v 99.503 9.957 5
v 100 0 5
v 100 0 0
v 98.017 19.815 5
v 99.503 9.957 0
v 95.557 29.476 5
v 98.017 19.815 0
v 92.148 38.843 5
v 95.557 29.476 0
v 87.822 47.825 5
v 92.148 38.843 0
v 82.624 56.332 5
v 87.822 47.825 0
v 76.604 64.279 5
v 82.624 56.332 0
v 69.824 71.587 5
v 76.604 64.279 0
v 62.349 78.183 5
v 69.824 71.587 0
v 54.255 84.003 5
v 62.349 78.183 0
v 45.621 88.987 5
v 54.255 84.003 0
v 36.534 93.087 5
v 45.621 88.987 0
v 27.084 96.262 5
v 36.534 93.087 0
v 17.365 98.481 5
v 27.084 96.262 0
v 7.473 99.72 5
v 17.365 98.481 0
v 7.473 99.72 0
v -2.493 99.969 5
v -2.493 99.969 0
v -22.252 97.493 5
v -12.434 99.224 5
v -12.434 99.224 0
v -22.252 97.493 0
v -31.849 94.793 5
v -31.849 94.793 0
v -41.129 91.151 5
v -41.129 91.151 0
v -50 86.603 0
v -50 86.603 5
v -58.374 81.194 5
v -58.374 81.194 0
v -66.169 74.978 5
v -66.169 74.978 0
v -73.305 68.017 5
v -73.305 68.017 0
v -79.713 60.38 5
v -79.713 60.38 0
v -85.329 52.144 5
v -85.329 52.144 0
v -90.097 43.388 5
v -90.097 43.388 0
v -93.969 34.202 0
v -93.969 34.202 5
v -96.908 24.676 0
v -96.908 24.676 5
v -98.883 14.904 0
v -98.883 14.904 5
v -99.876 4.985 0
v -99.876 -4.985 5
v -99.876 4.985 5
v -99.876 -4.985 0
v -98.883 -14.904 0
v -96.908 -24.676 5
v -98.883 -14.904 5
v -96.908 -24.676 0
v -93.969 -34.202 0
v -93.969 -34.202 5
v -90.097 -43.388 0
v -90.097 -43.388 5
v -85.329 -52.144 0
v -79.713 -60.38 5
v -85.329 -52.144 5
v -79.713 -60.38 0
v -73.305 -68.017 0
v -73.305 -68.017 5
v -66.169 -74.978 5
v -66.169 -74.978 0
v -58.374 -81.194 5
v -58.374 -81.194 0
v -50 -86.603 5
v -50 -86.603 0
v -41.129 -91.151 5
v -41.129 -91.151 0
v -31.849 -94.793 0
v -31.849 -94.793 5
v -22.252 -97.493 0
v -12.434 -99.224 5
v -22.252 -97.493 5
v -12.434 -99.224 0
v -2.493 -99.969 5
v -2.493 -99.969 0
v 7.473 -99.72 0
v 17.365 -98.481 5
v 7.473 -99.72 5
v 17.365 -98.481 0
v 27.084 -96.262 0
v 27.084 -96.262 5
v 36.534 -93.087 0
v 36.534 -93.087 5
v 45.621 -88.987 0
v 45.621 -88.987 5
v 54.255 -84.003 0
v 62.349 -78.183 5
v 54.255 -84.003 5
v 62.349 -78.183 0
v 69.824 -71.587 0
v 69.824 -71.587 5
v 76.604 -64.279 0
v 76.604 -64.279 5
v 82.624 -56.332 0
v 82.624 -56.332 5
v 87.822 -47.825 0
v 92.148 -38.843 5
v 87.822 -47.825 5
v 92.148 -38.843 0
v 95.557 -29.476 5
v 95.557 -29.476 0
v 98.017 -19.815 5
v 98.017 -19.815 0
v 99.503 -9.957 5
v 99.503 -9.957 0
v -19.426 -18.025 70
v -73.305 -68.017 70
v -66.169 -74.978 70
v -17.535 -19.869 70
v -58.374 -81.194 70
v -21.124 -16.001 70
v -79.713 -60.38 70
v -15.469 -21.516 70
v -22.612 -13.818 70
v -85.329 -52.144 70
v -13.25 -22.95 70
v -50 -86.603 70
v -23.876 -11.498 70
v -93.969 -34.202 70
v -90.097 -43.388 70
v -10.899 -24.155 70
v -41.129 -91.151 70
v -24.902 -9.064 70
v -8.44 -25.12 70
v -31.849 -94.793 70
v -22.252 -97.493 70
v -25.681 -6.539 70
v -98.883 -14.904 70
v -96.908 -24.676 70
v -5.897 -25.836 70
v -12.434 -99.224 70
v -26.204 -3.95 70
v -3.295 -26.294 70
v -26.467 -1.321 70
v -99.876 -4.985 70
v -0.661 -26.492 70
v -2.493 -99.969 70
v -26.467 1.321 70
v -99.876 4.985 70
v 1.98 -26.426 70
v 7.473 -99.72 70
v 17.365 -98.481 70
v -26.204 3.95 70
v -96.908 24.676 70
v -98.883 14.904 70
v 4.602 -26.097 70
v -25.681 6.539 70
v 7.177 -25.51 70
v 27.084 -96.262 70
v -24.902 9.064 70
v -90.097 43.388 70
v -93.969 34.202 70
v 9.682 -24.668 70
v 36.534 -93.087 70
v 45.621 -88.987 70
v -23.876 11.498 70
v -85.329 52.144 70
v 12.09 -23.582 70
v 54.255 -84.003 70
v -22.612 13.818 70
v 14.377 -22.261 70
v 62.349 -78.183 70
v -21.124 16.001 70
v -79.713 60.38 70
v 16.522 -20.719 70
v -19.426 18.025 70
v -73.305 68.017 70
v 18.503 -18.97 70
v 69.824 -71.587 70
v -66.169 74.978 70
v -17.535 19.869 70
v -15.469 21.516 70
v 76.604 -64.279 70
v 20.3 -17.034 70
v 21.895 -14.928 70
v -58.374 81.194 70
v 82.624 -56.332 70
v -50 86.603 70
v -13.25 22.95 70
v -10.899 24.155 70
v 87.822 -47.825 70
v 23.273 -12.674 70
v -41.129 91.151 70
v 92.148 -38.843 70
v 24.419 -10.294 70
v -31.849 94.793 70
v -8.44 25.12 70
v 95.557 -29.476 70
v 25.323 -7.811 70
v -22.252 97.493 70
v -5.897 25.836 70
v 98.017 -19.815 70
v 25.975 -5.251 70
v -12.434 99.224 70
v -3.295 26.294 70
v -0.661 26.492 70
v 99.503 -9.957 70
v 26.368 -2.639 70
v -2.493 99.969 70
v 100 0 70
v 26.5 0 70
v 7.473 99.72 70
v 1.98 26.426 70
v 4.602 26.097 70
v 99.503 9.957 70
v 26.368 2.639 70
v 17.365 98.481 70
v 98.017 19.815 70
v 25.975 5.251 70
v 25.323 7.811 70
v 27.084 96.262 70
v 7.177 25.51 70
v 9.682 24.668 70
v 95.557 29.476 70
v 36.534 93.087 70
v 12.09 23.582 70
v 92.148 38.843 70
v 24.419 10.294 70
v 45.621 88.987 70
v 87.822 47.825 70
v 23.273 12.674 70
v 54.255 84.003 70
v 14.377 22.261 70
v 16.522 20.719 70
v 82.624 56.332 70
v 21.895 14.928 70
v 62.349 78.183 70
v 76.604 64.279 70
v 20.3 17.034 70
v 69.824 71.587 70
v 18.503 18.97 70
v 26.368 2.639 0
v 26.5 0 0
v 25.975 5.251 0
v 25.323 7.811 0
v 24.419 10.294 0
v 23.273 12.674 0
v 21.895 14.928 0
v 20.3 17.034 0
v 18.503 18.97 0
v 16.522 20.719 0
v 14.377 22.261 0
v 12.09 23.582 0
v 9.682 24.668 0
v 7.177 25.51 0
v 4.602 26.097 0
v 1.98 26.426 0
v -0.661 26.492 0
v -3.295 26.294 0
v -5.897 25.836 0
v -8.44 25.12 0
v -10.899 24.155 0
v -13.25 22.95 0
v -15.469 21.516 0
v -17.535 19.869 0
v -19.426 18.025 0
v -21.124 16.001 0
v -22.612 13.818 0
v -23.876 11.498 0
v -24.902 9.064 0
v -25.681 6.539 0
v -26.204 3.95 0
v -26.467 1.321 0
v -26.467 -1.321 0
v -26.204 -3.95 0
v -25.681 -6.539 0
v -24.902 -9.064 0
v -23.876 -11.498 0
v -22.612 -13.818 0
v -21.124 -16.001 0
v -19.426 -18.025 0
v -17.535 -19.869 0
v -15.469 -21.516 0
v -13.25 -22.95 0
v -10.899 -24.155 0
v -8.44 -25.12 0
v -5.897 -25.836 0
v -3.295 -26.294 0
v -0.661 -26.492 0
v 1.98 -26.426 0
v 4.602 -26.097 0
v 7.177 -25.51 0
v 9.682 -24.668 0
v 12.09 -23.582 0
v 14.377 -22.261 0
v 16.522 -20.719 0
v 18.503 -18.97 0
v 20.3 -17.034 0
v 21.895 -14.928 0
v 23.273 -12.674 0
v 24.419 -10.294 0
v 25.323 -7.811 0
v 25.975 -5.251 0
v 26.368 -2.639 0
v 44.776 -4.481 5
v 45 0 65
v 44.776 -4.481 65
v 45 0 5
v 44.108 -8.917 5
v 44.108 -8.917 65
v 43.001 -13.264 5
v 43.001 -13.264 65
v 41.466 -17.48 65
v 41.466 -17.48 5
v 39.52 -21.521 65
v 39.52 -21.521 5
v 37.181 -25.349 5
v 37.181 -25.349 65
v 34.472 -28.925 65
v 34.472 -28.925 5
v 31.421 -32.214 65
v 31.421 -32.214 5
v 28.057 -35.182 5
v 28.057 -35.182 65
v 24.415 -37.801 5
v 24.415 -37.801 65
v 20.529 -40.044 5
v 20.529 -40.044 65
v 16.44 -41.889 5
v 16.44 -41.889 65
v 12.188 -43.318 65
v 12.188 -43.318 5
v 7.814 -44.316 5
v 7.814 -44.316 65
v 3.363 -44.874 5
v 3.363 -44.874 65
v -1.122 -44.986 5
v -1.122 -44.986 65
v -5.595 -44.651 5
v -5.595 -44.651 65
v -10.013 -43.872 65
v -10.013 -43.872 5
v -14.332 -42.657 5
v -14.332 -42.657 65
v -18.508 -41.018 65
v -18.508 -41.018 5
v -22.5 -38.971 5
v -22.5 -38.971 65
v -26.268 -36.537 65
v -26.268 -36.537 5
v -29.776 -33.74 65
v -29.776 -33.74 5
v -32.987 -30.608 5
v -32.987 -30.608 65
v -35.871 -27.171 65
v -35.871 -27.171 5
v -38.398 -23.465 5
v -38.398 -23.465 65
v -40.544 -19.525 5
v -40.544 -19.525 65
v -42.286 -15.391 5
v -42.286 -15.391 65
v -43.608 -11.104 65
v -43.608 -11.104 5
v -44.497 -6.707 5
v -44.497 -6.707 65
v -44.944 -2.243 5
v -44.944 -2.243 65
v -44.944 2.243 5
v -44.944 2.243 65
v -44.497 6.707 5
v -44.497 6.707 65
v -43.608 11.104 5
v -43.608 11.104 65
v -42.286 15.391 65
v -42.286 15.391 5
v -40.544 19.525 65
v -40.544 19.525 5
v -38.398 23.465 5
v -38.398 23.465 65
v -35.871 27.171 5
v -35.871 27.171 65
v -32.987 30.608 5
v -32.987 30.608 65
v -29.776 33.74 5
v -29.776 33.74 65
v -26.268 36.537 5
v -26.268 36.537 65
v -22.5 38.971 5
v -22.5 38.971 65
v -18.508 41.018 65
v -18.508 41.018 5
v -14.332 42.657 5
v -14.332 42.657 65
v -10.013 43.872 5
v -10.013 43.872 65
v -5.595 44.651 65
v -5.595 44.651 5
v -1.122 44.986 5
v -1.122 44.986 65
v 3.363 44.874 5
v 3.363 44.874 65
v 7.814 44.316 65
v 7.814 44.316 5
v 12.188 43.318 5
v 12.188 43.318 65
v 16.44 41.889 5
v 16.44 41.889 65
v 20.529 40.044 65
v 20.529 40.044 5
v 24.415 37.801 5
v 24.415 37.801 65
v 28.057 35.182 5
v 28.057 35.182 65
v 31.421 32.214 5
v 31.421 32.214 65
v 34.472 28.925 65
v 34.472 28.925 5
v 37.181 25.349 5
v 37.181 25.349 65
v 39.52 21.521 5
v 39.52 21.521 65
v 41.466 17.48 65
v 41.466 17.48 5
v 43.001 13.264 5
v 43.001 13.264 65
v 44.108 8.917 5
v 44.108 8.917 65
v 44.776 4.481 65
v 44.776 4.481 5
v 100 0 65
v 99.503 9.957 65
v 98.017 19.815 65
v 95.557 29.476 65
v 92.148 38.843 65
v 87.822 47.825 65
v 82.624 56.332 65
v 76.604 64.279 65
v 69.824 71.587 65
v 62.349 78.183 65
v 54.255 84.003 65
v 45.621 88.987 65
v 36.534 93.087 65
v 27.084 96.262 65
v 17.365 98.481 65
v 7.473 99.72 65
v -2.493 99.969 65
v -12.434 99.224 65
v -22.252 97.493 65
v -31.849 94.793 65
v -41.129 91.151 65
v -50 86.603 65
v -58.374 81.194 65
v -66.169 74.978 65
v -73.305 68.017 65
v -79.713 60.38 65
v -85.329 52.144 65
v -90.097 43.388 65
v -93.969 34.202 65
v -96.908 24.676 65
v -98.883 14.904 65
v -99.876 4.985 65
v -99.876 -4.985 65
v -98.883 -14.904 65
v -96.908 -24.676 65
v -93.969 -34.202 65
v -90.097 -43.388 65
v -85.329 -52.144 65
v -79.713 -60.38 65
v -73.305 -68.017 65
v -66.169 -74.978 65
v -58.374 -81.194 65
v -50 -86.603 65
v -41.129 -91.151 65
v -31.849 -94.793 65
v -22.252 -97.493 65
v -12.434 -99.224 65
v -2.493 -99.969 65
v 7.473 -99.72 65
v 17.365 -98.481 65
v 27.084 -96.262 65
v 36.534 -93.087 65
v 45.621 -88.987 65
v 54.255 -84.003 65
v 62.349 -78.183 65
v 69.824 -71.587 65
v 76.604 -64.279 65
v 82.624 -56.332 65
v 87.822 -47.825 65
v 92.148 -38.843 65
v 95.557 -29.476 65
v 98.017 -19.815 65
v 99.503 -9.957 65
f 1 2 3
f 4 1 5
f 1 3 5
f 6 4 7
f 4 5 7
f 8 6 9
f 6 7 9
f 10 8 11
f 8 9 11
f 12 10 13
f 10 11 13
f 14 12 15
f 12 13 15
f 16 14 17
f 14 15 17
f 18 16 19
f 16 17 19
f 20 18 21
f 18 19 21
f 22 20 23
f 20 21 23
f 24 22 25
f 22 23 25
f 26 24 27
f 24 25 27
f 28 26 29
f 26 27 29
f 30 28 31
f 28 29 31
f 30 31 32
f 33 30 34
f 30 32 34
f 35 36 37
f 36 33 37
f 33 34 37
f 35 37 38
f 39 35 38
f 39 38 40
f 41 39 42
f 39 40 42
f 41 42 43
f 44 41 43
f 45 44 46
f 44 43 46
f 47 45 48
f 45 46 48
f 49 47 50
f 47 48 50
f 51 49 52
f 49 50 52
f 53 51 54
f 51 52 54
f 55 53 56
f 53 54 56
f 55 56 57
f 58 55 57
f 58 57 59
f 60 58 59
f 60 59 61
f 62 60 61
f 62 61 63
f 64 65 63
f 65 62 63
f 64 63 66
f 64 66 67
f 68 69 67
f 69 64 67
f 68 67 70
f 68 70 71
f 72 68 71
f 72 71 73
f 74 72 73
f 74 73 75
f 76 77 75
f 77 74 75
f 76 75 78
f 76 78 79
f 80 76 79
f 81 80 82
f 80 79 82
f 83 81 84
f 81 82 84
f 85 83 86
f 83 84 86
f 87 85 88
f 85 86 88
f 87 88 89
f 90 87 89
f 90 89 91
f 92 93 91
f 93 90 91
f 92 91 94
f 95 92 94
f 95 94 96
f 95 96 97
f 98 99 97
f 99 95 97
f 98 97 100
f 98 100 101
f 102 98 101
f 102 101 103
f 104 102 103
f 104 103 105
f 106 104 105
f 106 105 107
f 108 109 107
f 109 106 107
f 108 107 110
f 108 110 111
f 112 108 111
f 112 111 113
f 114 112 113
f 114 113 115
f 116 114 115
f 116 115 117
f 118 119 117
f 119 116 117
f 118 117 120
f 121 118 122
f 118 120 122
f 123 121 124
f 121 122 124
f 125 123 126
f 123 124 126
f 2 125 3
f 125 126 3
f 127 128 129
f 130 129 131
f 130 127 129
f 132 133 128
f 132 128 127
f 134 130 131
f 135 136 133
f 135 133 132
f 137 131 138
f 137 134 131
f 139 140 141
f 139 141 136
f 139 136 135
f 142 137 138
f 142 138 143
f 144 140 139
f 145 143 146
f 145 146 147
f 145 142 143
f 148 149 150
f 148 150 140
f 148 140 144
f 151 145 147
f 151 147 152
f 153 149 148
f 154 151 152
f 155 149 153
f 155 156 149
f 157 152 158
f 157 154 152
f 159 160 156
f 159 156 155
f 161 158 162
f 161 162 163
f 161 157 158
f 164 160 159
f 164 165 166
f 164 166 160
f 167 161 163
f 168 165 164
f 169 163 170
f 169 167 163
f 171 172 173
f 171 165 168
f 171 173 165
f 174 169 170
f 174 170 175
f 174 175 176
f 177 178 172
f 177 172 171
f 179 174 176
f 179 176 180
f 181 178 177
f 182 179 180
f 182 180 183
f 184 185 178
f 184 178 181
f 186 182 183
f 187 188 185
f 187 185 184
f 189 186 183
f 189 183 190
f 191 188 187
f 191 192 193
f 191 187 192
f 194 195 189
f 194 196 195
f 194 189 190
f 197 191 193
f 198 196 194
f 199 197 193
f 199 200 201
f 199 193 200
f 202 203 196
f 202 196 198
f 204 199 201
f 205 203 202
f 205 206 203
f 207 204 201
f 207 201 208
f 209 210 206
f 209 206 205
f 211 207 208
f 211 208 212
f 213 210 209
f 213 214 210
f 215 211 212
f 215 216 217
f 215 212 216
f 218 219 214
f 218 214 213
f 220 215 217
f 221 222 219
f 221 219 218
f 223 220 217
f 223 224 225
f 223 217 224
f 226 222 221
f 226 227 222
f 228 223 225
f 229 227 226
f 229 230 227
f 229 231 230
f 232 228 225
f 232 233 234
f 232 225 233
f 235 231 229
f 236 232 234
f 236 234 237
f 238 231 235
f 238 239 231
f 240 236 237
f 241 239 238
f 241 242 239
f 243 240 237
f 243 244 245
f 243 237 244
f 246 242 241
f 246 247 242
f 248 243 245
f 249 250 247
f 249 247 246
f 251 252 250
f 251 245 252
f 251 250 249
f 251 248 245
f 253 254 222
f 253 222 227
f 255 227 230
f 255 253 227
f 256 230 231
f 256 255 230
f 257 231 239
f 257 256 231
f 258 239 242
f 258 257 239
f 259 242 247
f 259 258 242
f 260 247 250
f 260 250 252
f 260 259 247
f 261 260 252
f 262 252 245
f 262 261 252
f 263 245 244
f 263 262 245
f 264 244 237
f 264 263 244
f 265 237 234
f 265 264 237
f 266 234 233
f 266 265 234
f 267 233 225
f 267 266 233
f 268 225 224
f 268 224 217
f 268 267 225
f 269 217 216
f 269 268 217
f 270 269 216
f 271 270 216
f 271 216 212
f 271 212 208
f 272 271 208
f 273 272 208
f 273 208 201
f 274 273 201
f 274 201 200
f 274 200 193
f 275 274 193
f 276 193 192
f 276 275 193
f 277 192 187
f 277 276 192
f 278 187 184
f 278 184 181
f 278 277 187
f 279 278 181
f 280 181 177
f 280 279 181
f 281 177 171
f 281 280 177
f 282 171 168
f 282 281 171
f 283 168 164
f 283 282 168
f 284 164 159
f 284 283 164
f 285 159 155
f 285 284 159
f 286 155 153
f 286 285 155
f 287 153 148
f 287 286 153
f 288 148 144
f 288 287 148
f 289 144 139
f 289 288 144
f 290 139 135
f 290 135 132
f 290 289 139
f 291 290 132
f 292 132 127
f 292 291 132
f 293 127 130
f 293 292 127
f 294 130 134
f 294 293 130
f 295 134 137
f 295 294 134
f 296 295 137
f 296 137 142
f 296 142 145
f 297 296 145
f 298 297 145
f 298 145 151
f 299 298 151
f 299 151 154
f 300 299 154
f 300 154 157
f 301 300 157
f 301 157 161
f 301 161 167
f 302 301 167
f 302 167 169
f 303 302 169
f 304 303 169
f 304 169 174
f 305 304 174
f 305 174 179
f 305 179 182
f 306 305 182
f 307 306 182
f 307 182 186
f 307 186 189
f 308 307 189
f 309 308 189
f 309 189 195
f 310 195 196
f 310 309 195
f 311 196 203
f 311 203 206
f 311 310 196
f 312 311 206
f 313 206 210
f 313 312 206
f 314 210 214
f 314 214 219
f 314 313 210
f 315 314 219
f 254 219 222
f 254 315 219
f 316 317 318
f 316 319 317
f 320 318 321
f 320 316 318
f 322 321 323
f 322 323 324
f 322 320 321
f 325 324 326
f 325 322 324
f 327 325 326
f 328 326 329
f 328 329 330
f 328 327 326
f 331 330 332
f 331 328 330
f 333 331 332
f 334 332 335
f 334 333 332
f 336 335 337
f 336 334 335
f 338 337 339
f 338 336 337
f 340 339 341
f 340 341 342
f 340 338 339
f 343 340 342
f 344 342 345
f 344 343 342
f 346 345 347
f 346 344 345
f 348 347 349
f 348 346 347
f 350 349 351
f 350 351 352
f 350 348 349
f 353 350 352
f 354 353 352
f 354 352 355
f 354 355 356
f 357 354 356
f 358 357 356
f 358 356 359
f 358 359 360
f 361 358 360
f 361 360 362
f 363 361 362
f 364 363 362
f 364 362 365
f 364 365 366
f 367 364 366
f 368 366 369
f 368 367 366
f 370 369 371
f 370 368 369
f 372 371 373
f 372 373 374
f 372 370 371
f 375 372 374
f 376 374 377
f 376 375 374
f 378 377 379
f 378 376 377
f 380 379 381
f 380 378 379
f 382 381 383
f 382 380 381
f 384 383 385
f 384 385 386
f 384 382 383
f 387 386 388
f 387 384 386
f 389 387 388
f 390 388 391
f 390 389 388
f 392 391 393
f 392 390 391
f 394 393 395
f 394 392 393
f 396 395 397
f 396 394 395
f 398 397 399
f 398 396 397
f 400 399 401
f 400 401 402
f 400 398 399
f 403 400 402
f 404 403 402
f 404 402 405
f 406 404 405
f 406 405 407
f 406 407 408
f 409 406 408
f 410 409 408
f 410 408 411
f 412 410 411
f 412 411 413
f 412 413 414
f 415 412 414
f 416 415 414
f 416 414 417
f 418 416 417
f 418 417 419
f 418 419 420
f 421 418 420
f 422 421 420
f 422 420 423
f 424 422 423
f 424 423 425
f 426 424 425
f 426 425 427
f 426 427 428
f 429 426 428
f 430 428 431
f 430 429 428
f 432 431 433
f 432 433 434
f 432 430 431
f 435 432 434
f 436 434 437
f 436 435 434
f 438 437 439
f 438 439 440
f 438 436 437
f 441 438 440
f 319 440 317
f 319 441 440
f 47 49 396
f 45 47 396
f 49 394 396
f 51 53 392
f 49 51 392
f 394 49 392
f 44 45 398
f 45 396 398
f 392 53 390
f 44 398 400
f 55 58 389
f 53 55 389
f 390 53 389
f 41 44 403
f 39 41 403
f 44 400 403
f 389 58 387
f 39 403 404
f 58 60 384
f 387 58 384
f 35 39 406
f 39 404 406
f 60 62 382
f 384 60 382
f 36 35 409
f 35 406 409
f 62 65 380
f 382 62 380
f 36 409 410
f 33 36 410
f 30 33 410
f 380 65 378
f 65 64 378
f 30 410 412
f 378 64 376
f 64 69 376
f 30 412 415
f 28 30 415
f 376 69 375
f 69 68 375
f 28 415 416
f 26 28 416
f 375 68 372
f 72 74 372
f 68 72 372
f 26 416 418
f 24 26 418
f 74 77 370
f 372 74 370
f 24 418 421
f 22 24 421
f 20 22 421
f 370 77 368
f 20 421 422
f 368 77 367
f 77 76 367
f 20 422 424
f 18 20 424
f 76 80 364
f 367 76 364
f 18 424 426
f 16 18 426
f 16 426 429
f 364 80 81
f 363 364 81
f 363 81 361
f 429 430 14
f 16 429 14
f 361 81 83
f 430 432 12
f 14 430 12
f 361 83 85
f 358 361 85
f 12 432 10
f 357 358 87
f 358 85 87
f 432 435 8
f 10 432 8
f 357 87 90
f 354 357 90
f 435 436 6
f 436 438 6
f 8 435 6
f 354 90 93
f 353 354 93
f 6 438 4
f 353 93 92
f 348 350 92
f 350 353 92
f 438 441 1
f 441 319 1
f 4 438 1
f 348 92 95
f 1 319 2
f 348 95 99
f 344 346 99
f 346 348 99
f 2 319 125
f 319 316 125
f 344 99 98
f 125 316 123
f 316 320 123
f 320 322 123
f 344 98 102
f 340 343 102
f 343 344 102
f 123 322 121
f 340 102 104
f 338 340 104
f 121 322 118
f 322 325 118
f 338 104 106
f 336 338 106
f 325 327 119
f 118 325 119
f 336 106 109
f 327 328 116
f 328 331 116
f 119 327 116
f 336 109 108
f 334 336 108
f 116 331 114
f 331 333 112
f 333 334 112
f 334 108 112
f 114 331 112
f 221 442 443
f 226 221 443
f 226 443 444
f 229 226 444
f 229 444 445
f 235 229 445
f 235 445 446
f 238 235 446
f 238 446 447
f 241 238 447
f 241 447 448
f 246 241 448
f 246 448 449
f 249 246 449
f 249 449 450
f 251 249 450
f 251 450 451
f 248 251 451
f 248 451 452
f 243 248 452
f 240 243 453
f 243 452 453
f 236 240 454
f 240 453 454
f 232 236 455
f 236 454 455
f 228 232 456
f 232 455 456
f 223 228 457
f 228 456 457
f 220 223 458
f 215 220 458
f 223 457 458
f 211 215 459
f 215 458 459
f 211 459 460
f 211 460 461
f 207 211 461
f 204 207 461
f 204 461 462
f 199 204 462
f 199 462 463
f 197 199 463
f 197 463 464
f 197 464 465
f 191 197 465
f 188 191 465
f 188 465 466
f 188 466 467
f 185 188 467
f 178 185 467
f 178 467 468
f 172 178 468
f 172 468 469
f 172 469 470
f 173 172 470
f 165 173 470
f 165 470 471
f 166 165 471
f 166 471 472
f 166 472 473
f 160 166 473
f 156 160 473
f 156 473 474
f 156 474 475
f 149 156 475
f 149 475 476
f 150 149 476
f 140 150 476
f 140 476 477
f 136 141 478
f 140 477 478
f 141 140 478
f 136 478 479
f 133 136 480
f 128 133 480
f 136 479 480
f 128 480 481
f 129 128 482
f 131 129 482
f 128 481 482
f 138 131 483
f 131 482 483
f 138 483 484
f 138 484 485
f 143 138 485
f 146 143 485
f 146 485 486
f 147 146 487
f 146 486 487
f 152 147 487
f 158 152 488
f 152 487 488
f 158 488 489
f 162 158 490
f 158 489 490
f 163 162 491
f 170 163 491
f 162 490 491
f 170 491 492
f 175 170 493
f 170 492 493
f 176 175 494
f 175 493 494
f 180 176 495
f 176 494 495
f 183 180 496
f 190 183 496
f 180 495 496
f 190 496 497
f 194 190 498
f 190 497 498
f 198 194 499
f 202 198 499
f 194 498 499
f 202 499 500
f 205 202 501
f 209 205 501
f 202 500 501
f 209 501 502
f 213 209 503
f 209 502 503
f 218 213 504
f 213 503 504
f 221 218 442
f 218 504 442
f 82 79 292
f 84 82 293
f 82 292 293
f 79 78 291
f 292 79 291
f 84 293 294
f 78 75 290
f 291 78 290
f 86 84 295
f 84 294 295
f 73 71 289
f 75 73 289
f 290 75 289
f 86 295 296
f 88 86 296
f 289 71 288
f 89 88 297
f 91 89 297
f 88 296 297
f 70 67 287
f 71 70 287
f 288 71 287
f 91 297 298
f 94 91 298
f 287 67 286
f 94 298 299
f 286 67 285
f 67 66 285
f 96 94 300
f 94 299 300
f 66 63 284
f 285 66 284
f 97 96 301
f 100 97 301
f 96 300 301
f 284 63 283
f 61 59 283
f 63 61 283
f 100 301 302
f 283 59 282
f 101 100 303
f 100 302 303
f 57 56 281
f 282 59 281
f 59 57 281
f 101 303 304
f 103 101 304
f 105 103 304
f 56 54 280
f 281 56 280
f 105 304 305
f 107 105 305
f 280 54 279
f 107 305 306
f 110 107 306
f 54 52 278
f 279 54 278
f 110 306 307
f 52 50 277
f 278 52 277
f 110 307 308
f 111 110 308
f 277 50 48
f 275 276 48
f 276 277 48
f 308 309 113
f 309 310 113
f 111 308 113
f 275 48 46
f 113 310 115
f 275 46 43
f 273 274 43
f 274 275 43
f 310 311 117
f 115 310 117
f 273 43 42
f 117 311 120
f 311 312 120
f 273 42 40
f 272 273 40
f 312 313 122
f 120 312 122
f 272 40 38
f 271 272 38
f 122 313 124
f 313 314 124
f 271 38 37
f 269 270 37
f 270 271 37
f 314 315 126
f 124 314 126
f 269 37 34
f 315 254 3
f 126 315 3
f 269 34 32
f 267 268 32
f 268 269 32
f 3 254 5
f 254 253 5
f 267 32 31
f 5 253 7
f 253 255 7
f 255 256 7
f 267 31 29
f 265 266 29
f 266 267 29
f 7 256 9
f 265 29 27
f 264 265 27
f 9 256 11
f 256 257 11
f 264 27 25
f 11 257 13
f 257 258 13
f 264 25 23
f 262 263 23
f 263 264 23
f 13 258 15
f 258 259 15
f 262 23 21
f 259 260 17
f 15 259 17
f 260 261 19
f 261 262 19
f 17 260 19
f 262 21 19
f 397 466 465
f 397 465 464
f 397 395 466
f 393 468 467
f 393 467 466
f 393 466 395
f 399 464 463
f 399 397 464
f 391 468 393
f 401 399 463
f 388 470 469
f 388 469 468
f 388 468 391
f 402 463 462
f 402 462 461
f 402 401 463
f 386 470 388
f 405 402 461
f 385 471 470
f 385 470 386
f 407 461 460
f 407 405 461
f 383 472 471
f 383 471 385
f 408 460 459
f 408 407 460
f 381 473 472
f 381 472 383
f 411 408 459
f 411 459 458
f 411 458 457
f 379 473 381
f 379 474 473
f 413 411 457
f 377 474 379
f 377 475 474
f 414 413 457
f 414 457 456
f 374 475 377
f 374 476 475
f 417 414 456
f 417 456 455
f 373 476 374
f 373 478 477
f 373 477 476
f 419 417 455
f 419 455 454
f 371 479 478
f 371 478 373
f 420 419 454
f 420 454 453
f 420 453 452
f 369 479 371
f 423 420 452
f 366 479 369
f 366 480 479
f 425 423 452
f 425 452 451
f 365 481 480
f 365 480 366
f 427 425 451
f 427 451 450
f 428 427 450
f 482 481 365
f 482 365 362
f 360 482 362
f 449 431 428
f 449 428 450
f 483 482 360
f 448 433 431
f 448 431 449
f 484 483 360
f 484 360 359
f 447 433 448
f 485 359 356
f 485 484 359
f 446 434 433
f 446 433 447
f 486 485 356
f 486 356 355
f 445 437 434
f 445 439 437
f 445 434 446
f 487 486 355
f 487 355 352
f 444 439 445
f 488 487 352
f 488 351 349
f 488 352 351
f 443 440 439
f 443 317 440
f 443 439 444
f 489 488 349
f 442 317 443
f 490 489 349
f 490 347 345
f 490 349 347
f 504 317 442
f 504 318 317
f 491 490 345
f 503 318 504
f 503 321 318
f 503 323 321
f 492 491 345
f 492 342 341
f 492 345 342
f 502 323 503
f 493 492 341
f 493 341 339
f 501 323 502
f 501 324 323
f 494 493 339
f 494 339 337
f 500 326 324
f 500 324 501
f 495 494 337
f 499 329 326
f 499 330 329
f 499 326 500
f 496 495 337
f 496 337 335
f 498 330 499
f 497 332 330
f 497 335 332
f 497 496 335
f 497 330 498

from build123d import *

# Parameters (mm, degrees)
SKETCH1_R           = 100
SKETCH1_R_2         = 26.5
BOSS_EXTRUDE1_DEPTH = 70
SKETCH2_W           = 55
SKETCH2_H           = 60


with BuildPart() as part:
    # Sketch1 → Boss-Extrude1 (new body)
    with BuildSketch(Plane.XY):
        Circle(SKETCH1_R)
        Circle(SKETCH1_R_2, mode=Mode.SUBTRACT)
    extrude(amount=BOSS_EXTRUDE1_DEPTH)

    # Sketch2 → Cut-Revolve1 (revolve, cut)
    with BuildSketch(Plane(origin=(0, 0, 0), x_dir=(1, 0, 0), z_dir=(0, 1, 0)), mode=Mode.PRIVATE) as cut_revolve1_sk:
        with Locations((-72.5, -35)):
            Rectangle(SKETCH2_W, SKETCH2_H)
    revolve(cut_revolve1_sk.sketch.rotate(Axis((0, 0, 0), (0, 0, -1)), 180), axis=Axis((0, 0, 0), (0, 0, -1)), mode=Mode.SUBTRACT)


solid = part.part
